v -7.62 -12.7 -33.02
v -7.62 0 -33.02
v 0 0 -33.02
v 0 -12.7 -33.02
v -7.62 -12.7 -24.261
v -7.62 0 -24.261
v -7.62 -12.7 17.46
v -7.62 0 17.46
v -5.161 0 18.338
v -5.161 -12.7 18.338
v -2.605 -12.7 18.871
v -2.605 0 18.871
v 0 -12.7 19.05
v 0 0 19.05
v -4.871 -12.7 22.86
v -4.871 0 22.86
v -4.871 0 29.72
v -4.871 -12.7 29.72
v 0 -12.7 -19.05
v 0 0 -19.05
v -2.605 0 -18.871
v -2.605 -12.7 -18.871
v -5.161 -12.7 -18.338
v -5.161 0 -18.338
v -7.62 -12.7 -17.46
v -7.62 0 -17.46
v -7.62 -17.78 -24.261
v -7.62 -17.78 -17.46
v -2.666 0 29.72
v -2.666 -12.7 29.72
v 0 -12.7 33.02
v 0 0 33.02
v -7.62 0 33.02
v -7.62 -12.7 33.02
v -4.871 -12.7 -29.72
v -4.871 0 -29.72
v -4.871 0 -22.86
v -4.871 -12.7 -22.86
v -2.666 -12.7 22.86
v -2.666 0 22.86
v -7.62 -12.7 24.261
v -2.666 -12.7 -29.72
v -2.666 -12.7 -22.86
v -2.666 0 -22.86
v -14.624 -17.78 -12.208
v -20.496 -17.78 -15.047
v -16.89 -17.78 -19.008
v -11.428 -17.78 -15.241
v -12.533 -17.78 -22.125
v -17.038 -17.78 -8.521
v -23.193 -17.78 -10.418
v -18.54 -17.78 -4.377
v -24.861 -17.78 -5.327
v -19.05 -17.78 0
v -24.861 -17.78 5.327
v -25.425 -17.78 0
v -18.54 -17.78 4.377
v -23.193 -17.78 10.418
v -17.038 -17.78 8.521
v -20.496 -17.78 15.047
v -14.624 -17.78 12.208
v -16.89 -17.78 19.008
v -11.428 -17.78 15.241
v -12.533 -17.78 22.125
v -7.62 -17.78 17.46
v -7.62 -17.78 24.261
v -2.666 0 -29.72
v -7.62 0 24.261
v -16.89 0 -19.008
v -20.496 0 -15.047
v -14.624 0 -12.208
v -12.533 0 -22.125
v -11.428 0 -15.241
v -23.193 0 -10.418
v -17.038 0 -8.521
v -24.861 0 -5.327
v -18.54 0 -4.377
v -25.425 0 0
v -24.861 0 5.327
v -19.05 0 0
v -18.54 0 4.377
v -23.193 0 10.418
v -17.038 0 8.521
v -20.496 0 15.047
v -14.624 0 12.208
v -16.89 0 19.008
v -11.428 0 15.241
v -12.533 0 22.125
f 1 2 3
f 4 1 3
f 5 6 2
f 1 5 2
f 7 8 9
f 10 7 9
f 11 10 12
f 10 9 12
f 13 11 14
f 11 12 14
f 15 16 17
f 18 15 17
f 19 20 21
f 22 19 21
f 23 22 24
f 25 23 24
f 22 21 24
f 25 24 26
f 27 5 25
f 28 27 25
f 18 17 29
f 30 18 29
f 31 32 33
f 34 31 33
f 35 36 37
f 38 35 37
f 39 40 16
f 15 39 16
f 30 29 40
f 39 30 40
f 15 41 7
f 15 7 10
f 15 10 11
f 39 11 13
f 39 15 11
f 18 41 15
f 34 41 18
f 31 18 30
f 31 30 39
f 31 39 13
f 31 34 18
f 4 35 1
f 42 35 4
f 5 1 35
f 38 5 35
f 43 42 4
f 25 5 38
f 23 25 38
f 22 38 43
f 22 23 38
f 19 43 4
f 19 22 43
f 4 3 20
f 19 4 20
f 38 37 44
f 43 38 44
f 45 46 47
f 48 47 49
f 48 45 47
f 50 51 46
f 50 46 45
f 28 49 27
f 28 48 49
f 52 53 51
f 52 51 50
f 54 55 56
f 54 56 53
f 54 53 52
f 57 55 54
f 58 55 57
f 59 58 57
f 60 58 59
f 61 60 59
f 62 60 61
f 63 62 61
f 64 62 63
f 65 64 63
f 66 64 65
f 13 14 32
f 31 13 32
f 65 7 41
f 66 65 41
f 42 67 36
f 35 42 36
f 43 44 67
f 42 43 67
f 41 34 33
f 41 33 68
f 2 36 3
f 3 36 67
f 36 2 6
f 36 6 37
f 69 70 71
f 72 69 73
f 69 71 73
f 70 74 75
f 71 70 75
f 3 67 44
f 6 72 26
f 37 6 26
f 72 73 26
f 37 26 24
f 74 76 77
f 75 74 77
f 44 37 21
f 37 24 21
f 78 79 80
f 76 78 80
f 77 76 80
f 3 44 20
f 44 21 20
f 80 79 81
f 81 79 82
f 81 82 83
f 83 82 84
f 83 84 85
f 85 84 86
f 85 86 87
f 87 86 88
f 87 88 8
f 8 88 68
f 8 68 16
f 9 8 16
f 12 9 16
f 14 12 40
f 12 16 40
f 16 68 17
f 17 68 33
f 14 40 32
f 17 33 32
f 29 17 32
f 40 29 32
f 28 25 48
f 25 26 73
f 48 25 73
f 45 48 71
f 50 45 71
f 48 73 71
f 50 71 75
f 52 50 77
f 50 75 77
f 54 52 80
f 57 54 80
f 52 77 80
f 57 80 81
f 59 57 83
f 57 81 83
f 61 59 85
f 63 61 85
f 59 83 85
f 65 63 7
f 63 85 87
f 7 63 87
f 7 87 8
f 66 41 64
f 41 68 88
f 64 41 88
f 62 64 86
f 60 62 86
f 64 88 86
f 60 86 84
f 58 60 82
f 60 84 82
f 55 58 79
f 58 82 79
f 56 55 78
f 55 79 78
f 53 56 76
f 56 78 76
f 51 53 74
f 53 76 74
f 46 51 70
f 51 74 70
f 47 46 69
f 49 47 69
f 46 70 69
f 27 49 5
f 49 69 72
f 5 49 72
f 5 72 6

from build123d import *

# Parameters (mm, degrees)
F1_DEPTH = 12.7
F2_DEPTH = 17.78


with BuildPart() as f1:
    # F0 (on Front) → F1 (new body)
    with BuildSketch(Plane.XZ):
        with BuildLine():
            ThreePointArc((-7.62, 17.4596133978), (-3.8920987123, 18.6481652613), (0, 19.05))
            Line((0, 19.05), (0, 25.4309050116))
            ThreePointArc((0, 25.4309050116), (-1.335031029, 25.3955492468), (-2.6663651194, 25.2901575092))
            Line((-2.6663651194, 25.2901575092), (-2.6663651194, 22.86))
            Line((-2.6663651194, 22.86), (-4.8713176481, 22.86))
            Line((-4.8713176481, 22.86), (-4.8713176481, 24.9589173434))
            ThreePointArc((-4.8713176481, 24.9589173434), (-6.2553989589, 24.6481649221), (-7.62, 24.260721841))
            Line((-7.62, 24.260721841), (-7.62, 17.4596133978))
        make_face()
        with BuildLine():
            ThreePointArc((-7.62, -17.4596133978), (-19.05, 0), (-7.62, 17.4596133978))
            Line((-7.62, 17.4596133978), (-7.62, 24.260721841))
            ThreePointArc((-7.62, 24.260721841), (-25.4254, 0), (-7.62, -24.260721841))
            Line((-7.62, -24.260721841), (-7.62, -17.4596133978))
        make_face()
        with BuildLine():
            ThreePointArc((-2.6663651194, 25.2901575092), (-1.335031029, 25.3955492468), (0, 25.4309050116))
            Line((0, 25.4309050116), (0, 33.02))
            Line((0, 33.02), (-7.62, 33.02))
            Line((-7.62, 33.02), (-7.62, 24.260721841))
            ThreePointArc((-7.62, 24.260721841), (-6.2553989589, 24.6481649221), (-4.8713176481, 24.9589173434))
            Line((-4.8713176481, 24.9589173434), (-4.8713176481, 29.7198501384))
            Line((-4.8713176481, 29.7198501384), (-2.6663651194, 29.7198501384))
            Line((-2.6663651194, 29.7198501384), (-2.6663651194, 25.2901575092))
        make_face()
        with BuildLine():
            ThreePointArc((0, -19.05), (-3.8920987123, -18.6481652613), (-7.62, -17.4596133978))
            Line((-7.62, -17.4596133978), (-7.62, -24.260721841))
            ThreePointArc((-7.62, -24.260721841), (-6.2553989589, -24.6481649221), (-4.8713176481, -24.9589173434))
            Line((-4.8713176481, -24.9589173434), (-4.8713176481, -22.86))
            Line((-4.8713176481, -22.86), (-2.6663651194, -22.86))
            Line((-2.6663651194, -22.86), (-2.6663651194, -25.2901575092))
            ThreePointArc((-2.6663651194, -25.2901575092), (-1.335031029, -25.3955492468), (0, -25.4309050116))
            Line((0, -25.4309050116), (0, -19.05))
        make_face()
        with BuildLine():
            ThreePointArc((-4.8713176481, -24.9589173434), (-6.2553989589, -24.6481649221), (-7.62, -24.260721841))
            Line((-7.62, -24.260721841), (-7.62, -33.02))
            Line((-7.62, -33.02), (0, -33.02))
            Line((0, -33.02), (0, -25.4309050116))
            ThreePointArc((0, -25.4309050116), (-1.335031029, -25.3955492468), (-2.6663651194, -25.2901575092))
            Line((-2.6663651194, -25.2901575092), (-2.6663651194, -29.7198501384))
            Line((-2.6663651194, -29.7198501384), (-4.8713176481, -29.7198501384))
            Line((-4.8713176481, -29.7198501384), (-4.8713176481, -24.9589173434))
        make_face()
    extrude(amount=F1_DEPTH)

    # F0 (on Front) → F2 (join)
    with BuildSketch(Plane.XZ):
        with BuildLine():
            ThreePointArc((-7.62, -17.4596133978), (-19.05, 0), (-7.62, 17.4596133978))
            Line((-7.62, 17.4596133978), (-7.62, 24.260721841))
            ThreePointArc((-7.62, 24.260721841), (-25.4254, 0), (-7.62, -24.260721841))
            Line((-7.62, -24.260721841), (-7.62, -17.4596133978))
        make_face()
    extrude(amount=F2_DEPTH)


solid = f1.part
